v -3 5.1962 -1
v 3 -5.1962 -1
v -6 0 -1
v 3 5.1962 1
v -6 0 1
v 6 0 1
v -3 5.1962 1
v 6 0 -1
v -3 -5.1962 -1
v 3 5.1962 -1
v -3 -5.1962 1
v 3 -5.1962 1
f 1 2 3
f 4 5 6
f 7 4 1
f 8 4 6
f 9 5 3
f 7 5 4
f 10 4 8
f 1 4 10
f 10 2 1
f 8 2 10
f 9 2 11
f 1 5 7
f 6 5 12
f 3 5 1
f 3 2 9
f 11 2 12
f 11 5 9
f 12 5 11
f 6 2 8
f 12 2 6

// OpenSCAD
hex(12);

module hex(iwidth,iCornerRad=1,iZ=2){
  hull(){
  for(a=[1:6]){
      rotate([0,0,60*a])
      translate([iwidth/2-iCornerRad,0,0])
      cylinder(r=iCornerRad,h=iZ,center=true);
    }
  }
} 
